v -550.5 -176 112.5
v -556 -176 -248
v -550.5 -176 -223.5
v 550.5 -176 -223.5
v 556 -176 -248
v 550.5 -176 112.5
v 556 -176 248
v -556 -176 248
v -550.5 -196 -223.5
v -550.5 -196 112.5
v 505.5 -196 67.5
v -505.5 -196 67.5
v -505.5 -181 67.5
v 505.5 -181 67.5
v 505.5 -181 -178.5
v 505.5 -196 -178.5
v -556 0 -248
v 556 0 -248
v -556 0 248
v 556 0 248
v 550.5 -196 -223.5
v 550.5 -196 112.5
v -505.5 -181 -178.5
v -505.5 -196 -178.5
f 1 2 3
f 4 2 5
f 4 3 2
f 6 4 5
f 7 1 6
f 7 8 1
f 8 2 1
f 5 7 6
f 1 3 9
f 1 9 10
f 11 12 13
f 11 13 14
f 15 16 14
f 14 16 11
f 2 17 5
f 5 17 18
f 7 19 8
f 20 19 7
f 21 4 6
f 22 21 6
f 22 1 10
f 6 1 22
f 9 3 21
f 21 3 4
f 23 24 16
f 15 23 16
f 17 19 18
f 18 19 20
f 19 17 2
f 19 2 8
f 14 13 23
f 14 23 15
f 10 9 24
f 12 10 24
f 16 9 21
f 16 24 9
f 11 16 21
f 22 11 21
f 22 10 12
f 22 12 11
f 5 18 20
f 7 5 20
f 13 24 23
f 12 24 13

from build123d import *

# Parameters (mm, degrees)
F0_W     = 1112
F0_H     = 496
F1_DEPTH = 176
F2_W     = 1101
F2_H     = 336
F3_DEPTH = 20
F4_W     = 1011
F4_H     = 246
F5_DEPTH = 15


with BuildPart() as f1:
    # F0 (on Front) → F1 (new body)
    with BuildSketch(Plane.XZ):
        Rectangle(F0_W, F0_H)
    extrude(amount=F1_DEPTH)

    # F2 (on face) → F3 (join)
    with BuildSketch(Plane.XZ.offset(176)):
        with Locations((0, -55.5)):
            Rectangle(F2_W, F2_H)
    extrude(amount=F3_DEPTH)

    # F4 (on face) → F5 (cut)
    with BuildSketch(Plane.XZ.offset(196)):
        with Locations((0, -55.5)):
            Rectangle(F4_W, F4_H)
    extrude(amount=-F5_DEPTH, mode=Mode.SUBTRACT)


solid = f1.part
